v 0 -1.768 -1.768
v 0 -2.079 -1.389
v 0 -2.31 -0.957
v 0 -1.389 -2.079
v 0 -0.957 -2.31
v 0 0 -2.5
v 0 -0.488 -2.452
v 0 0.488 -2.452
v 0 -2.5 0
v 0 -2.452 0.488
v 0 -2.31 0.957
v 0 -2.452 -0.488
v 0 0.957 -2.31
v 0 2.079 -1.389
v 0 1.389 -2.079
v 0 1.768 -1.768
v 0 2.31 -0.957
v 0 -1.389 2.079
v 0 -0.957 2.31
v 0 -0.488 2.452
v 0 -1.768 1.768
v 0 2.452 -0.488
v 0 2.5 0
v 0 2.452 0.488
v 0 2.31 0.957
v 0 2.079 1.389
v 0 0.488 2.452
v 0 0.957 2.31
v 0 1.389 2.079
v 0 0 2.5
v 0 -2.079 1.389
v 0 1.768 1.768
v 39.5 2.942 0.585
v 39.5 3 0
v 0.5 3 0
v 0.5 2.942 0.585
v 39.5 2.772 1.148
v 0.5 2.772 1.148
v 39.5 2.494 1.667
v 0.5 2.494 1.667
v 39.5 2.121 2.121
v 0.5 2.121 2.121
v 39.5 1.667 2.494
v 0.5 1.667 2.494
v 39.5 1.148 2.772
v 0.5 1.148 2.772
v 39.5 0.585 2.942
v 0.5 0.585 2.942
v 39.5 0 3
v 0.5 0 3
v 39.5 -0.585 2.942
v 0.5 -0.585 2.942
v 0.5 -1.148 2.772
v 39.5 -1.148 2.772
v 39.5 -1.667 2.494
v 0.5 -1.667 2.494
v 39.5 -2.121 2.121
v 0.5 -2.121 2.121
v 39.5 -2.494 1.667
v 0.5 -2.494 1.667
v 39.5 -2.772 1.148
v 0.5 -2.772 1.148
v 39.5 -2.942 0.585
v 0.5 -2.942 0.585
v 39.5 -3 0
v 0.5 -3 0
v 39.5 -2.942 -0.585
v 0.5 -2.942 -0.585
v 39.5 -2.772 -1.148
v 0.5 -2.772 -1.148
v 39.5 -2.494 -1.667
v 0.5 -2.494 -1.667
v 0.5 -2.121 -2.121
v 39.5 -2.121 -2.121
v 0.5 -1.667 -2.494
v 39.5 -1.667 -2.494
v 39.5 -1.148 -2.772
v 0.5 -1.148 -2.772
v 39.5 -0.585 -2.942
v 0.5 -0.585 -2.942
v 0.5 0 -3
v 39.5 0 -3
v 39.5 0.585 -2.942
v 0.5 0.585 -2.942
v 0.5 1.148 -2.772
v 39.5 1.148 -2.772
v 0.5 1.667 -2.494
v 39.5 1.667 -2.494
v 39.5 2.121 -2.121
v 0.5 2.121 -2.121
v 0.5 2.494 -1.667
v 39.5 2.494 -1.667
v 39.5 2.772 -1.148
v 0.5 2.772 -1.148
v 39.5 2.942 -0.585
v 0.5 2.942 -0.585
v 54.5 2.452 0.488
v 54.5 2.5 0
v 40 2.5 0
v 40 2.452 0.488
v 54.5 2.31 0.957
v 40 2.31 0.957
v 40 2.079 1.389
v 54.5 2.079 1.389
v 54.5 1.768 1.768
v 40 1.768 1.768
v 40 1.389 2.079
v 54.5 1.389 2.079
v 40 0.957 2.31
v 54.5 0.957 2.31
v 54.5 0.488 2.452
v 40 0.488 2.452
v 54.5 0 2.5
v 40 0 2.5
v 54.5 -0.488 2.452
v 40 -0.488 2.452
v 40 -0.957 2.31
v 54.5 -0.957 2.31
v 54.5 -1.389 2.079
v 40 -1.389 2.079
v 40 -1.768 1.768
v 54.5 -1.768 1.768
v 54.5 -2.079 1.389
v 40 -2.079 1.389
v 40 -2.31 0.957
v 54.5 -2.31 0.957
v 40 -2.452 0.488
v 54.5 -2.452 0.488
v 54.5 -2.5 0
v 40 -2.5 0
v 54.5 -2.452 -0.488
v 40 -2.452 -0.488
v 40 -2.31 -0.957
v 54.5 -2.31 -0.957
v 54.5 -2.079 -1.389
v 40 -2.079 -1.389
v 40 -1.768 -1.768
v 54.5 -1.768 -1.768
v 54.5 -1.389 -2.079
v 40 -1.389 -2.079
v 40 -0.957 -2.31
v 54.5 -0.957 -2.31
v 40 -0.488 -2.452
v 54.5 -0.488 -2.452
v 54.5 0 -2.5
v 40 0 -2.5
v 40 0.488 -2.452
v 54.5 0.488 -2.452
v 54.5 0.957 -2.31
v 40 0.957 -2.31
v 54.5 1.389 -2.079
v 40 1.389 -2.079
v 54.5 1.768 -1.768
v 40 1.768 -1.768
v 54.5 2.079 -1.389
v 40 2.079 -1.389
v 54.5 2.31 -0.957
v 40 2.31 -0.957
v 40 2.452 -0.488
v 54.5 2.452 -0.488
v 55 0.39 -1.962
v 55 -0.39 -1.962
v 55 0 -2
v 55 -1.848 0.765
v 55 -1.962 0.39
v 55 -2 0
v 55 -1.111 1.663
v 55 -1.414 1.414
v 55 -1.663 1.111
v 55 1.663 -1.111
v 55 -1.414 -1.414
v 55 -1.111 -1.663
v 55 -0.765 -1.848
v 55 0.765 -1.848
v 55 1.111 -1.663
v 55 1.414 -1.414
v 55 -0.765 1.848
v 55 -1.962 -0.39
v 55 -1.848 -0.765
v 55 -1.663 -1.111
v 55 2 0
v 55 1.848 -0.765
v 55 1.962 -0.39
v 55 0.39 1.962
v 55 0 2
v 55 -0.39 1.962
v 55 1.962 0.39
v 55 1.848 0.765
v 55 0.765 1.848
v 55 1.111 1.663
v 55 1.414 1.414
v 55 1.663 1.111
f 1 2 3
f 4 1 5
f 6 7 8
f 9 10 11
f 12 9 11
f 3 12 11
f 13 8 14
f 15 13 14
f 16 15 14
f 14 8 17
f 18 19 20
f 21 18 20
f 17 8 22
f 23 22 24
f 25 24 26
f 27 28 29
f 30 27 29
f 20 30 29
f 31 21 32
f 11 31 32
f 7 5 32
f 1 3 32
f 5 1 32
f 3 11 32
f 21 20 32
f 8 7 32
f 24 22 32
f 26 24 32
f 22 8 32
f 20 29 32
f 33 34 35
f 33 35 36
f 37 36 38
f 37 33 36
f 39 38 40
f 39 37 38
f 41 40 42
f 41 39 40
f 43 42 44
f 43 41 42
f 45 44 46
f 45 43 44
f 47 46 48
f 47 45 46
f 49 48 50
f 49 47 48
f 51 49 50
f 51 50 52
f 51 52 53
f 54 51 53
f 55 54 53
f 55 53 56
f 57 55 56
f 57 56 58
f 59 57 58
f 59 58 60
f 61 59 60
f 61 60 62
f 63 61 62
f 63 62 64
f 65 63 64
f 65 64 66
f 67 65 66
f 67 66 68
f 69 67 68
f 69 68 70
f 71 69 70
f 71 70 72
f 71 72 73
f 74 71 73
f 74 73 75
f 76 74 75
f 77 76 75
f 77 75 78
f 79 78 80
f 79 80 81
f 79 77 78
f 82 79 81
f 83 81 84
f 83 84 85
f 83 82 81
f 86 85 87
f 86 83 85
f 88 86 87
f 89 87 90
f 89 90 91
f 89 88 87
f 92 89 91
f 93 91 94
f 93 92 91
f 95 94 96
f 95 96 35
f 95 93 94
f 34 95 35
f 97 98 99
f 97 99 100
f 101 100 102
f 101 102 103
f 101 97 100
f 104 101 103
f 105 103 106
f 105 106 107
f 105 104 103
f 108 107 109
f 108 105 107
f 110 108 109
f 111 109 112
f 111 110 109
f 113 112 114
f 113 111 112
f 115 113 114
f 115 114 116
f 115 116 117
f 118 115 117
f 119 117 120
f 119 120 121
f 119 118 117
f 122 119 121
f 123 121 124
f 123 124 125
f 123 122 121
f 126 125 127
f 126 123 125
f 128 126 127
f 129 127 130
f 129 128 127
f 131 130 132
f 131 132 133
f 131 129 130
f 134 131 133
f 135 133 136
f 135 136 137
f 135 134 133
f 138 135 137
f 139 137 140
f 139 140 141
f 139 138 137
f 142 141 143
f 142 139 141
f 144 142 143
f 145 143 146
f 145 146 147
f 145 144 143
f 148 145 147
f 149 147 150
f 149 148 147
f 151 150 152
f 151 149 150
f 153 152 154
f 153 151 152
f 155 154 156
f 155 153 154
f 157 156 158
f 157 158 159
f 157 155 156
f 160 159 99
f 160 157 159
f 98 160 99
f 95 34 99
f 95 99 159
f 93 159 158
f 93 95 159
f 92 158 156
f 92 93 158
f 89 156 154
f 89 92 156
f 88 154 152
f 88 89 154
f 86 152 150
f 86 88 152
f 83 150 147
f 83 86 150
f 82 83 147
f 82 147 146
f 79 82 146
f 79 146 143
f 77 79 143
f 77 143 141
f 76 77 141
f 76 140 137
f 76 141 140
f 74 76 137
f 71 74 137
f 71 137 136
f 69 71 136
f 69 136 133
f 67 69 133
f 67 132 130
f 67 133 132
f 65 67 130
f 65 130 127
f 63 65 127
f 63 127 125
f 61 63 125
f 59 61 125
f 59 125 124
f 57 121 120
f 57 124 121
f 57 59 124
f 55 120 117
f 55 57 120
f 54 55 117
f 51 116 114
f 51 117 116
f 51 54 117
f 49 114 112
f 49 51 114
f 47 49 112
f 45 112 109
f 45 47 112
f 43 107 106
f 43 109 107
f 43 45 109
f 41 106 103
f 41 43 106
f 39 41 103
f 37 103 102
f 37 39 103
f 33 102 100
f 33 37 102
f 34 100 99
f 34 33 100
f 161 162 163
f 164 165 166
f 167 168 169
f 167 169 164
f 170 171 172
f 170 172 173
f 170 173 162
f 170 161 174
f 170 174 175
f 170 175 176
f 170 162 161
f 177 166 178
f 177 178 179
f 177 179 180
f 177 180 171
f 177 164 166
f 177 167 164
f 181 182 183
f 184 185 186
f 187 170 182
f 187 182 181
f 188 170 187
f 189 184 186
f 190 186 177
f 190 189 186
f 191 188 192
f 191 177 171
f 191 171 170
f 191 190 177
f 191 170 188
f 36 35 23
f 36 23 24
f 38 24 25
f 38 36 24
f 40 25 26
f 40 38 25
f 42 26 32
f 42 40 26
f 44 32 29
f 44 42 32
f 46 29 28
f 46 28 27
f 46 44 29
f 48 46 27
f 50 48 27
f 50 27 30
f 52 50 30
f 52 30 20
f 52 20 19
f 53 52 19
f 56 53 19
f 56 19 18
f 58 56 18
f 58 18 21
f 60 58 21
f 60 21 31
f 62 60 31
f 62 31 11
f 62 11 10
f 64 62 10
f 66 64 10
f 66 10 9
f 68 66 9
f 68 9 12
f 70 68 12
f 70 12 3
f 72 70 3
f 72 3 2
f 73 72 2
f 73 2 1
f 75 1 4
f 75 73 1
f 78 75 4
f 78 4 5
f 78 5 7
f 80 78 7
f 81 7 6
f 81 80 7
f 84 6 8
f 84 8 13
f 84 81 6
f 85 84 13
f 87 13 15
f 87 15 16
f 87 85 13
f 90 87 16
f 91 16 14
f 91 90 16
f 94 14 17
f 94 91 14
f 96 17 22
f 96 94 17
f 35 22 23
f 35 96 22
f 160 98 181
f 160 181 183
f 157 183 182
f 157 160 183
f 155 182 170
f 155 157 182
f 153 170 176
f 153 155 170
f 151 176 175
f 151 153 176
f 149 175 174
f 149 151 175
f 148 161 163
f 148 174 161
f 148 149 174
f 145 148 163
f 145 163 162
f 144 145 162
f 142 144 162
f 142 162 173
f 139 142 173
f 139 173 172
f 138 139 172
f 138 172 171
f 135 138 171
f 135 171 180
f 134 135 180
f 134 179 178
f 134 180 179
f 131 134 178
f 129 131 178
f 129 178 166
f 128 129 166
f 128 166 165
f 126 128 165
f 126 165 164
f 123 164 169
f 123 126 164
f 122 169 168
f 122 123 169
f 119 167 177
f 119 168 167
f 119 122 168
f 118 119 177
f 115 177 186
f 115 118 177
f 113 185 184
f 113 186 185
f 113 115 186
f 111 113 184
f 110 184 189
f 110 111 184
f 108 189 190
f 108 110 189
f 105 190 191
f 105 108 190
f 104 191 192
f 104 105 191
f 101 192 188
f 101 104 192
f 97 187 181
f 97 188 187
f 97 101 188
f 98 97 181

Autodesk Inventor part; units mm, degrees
ref_plane "Startebene" through (0, 0, 0) normal (1, 0, 0) x (0, 1, 0)
ref_plane "XZ Plane" through (0, 0, 0) normal (0, 1, 0) x (-1, 0, 0)
ref_plane "XY Plane" through (0, 0, 0) normal (0, 0, 1) x (1, 0, 0)
sketch "Hauptskizze" plane through (0, 0, 0) normal (0, 0, 1) x (1, 0, 0)
  line L0 (0, 0) -> (55, 0)
  line L1 (0, 0) -> (0, 3)
  line L2 (40, 3) -> (40, 2.5)
  line L3 (0, 3) -> (40, 3)
  line L4 (55, 2.5) -> (55, 0)
  line L5 (40, 2.5) -> (55, 2.5)
  dimension "d3" = 6
  dimension "d14" = 5
revolve "Umdrehung1" add sketch "Hauptskizze" angle 360 about axis through (0, 0, 0) along (1, 0, 0)
chamfer "Fase4" distance 0.5 angle 45 1 edges at (0, -3, 0) measured on face at (13.3333, 2.9612, -0.4812)
chamfer "Fase5" distance 0.5 angle 45 1 edges at (55, -2.5, 0) measured on face at (45, 2.4919, -0.2012)
chamfer "Fase3" [suppressed]
chamfer "Fase2" distance 0.5 angle 45 1 edges at (40, -3, 0) measured on face at (13.6667, 2.9903, -0.2414)
properties part number "Welle" material "Steel"
